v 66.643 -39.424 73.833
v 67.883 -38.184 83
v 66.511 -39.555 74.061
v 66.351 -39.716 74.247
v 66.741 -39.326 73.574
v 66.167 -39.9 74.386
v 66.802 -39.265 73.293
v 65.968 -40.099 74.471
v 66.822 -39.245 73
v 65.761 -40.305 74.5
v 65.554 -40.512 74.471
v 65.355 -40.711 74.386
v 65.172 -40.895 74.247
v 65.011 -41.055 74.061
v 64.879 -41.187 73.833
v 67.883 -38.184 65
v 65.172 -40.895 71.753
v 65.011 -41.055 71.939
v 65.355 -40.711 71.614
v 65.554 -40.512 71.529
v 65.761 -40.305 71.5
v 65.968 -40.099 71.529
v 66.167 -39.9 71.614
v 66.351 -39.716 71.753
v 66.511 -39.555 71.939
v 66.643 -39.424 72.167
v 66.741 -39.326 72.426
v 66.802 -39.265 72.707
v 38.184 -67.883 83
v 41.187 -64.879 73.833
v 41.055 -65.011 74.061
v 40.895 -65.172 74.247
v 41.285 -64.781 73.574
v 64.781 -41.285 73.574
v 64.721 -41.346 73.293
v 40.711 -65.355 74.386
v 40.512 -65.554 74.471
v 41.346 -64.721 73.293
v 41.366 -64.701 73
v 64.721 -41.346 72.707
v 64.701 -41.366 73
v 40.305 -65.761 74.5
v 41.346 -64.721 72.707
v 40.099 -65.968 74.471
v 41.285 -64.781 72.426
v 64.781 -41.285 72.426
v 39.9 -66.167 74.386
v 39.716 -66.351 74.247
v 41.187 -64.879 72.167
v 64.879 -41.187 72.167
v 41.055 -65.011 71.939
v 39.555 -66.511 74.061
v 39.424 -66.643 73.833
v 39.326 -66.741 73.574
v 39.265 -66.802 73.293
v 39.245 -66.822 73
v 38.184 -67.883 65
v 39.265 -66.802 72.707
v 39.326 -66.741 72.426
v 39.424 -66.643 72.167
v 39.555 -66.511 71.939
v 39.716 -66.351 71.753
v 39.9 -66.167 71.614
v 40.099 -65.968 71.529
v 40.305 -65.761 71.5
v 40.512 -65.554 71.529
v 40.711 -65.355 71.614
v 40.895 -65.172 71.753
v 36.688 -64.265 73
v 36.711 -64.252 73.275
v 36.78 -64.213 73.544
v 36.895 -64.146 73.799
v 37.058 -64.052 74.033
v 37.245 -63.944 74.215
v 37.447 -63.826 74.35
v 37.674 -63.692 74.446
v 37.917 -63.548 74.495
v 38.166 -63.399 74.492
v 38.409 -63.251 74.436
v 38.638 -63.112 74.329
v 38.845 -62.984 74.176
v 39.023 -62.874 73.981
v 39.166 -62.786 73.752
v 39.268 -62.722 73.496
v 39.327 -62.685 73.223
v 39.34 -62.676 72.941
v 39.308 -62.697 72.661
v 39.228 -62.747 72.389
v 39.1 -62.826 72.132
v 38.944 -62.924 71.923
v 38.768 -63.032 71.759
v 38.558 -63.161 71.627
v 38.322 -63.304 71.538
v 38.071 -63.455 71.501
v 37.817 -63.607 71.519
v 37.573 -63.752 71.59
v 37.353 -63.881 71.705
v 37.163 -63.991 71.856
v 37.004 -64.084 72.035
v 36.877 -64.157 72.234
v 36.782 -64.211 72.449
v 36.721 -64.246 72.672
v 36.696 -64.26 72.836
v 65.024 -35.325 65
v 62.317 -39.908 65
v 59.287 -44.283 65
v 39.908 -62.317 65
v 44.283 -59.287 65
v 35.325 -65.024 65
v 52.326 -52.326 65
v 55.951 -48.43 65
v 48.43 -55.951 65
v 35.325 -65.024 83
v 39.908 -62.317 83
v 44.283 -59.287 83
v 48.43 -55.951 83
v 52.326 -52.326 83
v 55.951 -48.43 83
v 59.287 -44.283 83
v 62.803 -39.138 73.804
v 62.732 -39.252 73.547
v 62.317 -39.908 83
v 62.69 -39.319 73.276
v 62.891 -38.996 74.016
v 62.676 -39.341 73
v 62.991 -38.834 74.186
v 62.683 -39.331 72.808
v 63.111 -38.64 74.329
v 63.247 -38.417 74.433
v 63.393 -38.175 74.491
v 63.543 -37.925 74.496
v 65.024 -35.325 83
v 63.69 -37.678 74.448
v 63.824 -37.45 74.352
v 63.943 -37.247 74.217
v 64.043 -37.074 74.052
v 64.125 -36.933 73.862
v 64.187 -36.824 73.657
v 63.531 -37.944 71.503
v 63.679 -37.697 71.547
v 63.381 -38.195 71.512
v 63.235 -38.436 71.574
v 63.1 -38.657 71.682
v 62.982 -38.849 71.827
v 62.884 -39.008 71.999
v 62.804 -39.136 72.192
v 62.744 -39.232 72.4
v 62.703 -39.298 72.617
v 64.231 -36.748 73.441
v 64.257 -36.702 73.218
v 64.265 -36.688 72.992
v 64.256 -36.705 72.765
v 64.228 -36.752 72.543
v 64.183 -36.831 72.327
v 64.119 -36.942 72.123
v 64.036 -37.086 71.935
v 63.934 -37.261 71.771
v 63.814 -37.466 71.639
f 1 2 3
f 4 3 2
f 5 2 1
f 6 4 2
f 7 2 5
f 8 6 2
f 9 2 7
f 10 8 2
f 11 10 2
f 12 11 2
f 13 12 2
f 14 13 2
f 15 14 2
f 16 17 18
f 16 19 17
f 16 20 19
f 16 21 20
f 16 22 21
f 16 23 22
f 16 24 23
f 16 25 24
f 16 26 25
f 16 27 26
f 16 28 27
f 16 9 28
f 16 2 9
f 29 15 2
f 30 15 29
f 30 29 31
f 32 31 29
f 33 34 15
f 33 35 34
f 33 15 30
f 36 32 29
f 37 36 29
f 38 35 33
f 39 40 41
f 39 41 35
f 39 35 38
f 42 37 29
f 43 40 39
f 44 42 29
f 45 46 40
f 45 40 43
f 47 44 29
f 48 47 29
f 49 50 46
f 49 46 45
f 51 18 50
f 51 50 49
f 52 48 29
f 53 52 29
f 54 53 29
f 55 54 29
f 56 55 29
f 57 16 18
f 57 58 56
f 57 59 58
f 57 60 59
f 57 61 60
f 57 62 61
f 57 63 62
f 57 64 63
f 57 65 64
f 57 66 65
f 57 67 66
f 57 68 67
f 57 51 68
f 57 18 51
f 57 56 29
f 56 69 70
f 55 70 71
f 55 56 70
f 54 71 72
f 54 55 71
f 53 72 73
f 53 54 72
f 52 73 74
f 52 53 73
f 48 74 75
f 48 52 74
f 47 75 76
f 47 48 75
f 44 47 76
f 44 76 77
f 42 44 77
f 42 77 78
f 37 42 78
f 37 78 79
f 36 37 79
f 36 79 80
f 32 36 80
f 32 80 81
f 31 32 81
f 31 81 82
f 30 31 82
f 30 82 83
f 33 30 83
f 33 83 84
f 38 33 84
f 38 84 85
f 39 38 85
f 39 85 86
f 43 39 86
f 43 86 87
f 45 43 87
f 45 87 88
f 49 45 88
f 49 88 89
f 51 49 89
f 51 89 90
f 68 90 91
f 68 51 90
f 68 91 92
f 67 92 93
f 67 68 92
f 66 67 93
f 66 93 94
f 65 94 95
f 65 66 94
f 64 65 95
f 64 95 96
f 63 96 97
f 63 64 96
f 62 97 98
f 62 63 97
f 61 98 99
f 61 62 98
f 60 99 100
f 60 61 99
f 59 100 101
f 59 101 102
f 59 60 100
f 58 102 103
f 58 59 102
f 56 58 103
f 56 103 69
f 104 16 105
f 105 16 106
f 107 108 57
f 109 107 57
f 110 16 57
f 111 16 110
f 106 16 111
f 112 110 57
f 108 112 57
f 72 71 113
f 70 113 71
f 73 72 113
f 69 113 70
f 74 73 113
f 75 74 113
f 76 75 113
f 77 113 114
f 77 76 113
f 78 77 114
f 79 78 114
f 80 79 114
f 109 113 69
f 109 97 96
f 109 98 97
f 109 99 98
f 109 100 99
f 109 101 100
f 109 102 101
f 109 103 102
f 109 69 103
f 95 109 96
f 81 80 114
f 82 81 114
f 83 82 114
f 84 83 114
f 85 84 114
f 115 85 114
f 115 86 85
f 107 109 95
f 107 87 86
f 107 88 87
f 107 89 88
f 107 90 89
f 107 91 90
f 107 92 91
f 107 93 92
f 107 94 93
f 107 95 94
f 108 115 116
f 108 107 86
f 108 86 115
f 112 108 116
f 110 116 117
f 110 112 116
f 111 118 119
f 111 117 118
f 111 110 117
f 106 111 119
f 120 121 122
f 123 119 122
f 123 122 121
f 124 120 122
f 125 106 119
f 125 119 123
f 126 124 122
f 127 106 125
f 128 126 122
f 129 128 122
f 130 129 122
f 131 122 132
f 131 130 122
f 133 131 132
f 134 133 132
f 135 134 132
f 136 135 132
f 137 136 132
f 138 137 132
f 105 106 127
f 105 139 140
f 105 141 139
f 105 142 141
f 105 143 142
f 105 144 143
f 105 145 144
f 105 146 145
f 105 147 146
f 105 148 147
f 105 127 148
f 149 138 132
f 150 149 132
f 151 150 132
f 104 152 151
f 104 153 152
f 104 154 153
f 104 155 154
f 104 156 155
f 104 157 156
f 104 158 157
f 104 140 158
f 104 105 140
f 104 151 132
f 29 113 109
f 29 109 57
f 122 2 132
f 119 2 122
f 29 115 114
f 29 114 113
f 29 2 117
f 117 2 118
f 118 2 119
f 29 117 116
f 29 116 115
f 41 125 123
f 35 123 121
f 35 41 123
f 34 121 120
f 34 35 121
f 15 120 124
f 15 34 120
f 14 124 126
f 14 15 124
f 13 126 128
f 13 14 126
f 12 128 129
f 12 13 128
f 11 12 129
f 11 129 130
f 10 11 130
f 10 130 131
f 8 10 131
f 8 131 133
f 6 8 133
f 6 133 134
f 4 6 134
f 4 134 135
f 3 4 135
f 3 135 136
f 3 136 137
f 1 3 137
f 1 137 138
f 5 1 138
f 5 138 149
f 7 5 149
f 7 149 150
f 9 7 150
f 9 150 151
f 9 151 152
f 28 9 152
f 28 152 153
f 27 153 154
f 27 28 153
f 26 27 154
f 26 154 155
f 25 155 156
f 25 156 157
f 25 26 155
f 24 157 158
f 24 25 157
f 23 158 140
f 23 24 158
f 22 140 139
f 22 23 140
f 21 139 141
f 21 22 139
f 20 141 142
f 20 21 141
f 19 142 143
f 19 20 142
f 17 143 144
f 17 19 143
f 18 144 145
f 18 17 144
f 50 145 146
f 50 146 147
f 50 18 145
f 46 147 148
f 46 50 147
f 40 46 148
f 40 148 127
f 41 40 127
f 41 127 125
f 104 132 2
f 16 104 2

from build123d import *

# Parameters (mm, degrees)
CYLINDER1726_R              = 1.5
CYLINDER1726_DEPTH          = 50
COMPOUND868_PLACEMENT_ANGLE = 225
CYLINDER1725_R              = 1.5
CYLINDER1725_DEPTH          = 50
COMPOUND869_PLACEMENT_ANGLE = 225
CYLINDER1724_R              = 74
CYLINDER1724_DEPTH          = 40
BOX685_W                    = 42
BOX685_H                    = 8
BOX685_DEPTH                = 18
COMPOUND862_PLACEMENT_ANGLE = 225


with BuildPart() as compound868:
    # Cylinder1726 → Cylinder1726 (new body)
    with BuildSketch(Plane(origin=(18, 100, 72), x_dir=(1, 0, 0), z_dir=(0, -1, 0))):
        Circle(CYLINDER1726_R)
    extrude(amount=CYLINDER1726_DEPTH)


with BuildPart() as compound868_1:
    # Compound868 placement: moved
    add(compound868.part.rotate(Axis((0, 0, 0), (0, 0, 1)), COMPOUND868_PLACEMENT_ANGLE))


with BuildPart() as compound867:
    # Cylinder1725 → Cylinder1725 (new body)
    with BuildSketch(Plane(origin=(-18, 100, 72), x_dir=(1, 0, 0), z_dir=(0, -1, 0))):
        Circle(CYLINDER1725_R)
    extrude(amount=CYLINDER1725_DEPTH)


with BuildPart() as compound867_1:
    # Compound869 placement: moved
    add(compound867.part.rotate(Axis((0, 0, 0), (0, 0, 1)), COMPOUND869_PLACEMENT_ANGLE))

    # Compound867: union Compound868
    add(compound868_1.part)


with BuildPart() as compound867_2:
    # Compound867 placement: moved
    add(compound867_1.part.moved(Location((0, 0, 1))))


with BuildPart() as v_lec1724:
    # Cylinder1724 → Cylinder1724 (new body)
    with BuildSketch(Plane.XY.offset(44)):
        Circle(CYLINDER1724_R)
    extrude(amount=CYLINDER1724_DEPTH)


with BuildPart() as cut499:
    # Box685 → Box685 (new body)
    with BuildSketch(Plane(origin=(-21, -23, 22), x_dir=(1, 0, 0), z_dir=(0, 0, 1))):
        with Locations((21, 4)):
            Rectangle(BOX685_W, BOX685_H)
    extrude(amount=BOX685_DEPTH)


with BuildPart() as cut499_1:
    # Compound862 placement: moved
    add(cut499.part.moved(Location((63.64, -63.64, 43))).rotate(Axis((63.64, -63.64, 43), (0, 0, 1)), COMPOUND862_PLACEMENT_ANGLE))

    # Cut498: cut Válec1724
    add(v_lec1724.part, mode=Mode.SUBTRACT)

    # Cut499: cut Compound867
    add(compound867_2.part, mode=Mode.SUBTRACT)


solid = cut499_1.part
